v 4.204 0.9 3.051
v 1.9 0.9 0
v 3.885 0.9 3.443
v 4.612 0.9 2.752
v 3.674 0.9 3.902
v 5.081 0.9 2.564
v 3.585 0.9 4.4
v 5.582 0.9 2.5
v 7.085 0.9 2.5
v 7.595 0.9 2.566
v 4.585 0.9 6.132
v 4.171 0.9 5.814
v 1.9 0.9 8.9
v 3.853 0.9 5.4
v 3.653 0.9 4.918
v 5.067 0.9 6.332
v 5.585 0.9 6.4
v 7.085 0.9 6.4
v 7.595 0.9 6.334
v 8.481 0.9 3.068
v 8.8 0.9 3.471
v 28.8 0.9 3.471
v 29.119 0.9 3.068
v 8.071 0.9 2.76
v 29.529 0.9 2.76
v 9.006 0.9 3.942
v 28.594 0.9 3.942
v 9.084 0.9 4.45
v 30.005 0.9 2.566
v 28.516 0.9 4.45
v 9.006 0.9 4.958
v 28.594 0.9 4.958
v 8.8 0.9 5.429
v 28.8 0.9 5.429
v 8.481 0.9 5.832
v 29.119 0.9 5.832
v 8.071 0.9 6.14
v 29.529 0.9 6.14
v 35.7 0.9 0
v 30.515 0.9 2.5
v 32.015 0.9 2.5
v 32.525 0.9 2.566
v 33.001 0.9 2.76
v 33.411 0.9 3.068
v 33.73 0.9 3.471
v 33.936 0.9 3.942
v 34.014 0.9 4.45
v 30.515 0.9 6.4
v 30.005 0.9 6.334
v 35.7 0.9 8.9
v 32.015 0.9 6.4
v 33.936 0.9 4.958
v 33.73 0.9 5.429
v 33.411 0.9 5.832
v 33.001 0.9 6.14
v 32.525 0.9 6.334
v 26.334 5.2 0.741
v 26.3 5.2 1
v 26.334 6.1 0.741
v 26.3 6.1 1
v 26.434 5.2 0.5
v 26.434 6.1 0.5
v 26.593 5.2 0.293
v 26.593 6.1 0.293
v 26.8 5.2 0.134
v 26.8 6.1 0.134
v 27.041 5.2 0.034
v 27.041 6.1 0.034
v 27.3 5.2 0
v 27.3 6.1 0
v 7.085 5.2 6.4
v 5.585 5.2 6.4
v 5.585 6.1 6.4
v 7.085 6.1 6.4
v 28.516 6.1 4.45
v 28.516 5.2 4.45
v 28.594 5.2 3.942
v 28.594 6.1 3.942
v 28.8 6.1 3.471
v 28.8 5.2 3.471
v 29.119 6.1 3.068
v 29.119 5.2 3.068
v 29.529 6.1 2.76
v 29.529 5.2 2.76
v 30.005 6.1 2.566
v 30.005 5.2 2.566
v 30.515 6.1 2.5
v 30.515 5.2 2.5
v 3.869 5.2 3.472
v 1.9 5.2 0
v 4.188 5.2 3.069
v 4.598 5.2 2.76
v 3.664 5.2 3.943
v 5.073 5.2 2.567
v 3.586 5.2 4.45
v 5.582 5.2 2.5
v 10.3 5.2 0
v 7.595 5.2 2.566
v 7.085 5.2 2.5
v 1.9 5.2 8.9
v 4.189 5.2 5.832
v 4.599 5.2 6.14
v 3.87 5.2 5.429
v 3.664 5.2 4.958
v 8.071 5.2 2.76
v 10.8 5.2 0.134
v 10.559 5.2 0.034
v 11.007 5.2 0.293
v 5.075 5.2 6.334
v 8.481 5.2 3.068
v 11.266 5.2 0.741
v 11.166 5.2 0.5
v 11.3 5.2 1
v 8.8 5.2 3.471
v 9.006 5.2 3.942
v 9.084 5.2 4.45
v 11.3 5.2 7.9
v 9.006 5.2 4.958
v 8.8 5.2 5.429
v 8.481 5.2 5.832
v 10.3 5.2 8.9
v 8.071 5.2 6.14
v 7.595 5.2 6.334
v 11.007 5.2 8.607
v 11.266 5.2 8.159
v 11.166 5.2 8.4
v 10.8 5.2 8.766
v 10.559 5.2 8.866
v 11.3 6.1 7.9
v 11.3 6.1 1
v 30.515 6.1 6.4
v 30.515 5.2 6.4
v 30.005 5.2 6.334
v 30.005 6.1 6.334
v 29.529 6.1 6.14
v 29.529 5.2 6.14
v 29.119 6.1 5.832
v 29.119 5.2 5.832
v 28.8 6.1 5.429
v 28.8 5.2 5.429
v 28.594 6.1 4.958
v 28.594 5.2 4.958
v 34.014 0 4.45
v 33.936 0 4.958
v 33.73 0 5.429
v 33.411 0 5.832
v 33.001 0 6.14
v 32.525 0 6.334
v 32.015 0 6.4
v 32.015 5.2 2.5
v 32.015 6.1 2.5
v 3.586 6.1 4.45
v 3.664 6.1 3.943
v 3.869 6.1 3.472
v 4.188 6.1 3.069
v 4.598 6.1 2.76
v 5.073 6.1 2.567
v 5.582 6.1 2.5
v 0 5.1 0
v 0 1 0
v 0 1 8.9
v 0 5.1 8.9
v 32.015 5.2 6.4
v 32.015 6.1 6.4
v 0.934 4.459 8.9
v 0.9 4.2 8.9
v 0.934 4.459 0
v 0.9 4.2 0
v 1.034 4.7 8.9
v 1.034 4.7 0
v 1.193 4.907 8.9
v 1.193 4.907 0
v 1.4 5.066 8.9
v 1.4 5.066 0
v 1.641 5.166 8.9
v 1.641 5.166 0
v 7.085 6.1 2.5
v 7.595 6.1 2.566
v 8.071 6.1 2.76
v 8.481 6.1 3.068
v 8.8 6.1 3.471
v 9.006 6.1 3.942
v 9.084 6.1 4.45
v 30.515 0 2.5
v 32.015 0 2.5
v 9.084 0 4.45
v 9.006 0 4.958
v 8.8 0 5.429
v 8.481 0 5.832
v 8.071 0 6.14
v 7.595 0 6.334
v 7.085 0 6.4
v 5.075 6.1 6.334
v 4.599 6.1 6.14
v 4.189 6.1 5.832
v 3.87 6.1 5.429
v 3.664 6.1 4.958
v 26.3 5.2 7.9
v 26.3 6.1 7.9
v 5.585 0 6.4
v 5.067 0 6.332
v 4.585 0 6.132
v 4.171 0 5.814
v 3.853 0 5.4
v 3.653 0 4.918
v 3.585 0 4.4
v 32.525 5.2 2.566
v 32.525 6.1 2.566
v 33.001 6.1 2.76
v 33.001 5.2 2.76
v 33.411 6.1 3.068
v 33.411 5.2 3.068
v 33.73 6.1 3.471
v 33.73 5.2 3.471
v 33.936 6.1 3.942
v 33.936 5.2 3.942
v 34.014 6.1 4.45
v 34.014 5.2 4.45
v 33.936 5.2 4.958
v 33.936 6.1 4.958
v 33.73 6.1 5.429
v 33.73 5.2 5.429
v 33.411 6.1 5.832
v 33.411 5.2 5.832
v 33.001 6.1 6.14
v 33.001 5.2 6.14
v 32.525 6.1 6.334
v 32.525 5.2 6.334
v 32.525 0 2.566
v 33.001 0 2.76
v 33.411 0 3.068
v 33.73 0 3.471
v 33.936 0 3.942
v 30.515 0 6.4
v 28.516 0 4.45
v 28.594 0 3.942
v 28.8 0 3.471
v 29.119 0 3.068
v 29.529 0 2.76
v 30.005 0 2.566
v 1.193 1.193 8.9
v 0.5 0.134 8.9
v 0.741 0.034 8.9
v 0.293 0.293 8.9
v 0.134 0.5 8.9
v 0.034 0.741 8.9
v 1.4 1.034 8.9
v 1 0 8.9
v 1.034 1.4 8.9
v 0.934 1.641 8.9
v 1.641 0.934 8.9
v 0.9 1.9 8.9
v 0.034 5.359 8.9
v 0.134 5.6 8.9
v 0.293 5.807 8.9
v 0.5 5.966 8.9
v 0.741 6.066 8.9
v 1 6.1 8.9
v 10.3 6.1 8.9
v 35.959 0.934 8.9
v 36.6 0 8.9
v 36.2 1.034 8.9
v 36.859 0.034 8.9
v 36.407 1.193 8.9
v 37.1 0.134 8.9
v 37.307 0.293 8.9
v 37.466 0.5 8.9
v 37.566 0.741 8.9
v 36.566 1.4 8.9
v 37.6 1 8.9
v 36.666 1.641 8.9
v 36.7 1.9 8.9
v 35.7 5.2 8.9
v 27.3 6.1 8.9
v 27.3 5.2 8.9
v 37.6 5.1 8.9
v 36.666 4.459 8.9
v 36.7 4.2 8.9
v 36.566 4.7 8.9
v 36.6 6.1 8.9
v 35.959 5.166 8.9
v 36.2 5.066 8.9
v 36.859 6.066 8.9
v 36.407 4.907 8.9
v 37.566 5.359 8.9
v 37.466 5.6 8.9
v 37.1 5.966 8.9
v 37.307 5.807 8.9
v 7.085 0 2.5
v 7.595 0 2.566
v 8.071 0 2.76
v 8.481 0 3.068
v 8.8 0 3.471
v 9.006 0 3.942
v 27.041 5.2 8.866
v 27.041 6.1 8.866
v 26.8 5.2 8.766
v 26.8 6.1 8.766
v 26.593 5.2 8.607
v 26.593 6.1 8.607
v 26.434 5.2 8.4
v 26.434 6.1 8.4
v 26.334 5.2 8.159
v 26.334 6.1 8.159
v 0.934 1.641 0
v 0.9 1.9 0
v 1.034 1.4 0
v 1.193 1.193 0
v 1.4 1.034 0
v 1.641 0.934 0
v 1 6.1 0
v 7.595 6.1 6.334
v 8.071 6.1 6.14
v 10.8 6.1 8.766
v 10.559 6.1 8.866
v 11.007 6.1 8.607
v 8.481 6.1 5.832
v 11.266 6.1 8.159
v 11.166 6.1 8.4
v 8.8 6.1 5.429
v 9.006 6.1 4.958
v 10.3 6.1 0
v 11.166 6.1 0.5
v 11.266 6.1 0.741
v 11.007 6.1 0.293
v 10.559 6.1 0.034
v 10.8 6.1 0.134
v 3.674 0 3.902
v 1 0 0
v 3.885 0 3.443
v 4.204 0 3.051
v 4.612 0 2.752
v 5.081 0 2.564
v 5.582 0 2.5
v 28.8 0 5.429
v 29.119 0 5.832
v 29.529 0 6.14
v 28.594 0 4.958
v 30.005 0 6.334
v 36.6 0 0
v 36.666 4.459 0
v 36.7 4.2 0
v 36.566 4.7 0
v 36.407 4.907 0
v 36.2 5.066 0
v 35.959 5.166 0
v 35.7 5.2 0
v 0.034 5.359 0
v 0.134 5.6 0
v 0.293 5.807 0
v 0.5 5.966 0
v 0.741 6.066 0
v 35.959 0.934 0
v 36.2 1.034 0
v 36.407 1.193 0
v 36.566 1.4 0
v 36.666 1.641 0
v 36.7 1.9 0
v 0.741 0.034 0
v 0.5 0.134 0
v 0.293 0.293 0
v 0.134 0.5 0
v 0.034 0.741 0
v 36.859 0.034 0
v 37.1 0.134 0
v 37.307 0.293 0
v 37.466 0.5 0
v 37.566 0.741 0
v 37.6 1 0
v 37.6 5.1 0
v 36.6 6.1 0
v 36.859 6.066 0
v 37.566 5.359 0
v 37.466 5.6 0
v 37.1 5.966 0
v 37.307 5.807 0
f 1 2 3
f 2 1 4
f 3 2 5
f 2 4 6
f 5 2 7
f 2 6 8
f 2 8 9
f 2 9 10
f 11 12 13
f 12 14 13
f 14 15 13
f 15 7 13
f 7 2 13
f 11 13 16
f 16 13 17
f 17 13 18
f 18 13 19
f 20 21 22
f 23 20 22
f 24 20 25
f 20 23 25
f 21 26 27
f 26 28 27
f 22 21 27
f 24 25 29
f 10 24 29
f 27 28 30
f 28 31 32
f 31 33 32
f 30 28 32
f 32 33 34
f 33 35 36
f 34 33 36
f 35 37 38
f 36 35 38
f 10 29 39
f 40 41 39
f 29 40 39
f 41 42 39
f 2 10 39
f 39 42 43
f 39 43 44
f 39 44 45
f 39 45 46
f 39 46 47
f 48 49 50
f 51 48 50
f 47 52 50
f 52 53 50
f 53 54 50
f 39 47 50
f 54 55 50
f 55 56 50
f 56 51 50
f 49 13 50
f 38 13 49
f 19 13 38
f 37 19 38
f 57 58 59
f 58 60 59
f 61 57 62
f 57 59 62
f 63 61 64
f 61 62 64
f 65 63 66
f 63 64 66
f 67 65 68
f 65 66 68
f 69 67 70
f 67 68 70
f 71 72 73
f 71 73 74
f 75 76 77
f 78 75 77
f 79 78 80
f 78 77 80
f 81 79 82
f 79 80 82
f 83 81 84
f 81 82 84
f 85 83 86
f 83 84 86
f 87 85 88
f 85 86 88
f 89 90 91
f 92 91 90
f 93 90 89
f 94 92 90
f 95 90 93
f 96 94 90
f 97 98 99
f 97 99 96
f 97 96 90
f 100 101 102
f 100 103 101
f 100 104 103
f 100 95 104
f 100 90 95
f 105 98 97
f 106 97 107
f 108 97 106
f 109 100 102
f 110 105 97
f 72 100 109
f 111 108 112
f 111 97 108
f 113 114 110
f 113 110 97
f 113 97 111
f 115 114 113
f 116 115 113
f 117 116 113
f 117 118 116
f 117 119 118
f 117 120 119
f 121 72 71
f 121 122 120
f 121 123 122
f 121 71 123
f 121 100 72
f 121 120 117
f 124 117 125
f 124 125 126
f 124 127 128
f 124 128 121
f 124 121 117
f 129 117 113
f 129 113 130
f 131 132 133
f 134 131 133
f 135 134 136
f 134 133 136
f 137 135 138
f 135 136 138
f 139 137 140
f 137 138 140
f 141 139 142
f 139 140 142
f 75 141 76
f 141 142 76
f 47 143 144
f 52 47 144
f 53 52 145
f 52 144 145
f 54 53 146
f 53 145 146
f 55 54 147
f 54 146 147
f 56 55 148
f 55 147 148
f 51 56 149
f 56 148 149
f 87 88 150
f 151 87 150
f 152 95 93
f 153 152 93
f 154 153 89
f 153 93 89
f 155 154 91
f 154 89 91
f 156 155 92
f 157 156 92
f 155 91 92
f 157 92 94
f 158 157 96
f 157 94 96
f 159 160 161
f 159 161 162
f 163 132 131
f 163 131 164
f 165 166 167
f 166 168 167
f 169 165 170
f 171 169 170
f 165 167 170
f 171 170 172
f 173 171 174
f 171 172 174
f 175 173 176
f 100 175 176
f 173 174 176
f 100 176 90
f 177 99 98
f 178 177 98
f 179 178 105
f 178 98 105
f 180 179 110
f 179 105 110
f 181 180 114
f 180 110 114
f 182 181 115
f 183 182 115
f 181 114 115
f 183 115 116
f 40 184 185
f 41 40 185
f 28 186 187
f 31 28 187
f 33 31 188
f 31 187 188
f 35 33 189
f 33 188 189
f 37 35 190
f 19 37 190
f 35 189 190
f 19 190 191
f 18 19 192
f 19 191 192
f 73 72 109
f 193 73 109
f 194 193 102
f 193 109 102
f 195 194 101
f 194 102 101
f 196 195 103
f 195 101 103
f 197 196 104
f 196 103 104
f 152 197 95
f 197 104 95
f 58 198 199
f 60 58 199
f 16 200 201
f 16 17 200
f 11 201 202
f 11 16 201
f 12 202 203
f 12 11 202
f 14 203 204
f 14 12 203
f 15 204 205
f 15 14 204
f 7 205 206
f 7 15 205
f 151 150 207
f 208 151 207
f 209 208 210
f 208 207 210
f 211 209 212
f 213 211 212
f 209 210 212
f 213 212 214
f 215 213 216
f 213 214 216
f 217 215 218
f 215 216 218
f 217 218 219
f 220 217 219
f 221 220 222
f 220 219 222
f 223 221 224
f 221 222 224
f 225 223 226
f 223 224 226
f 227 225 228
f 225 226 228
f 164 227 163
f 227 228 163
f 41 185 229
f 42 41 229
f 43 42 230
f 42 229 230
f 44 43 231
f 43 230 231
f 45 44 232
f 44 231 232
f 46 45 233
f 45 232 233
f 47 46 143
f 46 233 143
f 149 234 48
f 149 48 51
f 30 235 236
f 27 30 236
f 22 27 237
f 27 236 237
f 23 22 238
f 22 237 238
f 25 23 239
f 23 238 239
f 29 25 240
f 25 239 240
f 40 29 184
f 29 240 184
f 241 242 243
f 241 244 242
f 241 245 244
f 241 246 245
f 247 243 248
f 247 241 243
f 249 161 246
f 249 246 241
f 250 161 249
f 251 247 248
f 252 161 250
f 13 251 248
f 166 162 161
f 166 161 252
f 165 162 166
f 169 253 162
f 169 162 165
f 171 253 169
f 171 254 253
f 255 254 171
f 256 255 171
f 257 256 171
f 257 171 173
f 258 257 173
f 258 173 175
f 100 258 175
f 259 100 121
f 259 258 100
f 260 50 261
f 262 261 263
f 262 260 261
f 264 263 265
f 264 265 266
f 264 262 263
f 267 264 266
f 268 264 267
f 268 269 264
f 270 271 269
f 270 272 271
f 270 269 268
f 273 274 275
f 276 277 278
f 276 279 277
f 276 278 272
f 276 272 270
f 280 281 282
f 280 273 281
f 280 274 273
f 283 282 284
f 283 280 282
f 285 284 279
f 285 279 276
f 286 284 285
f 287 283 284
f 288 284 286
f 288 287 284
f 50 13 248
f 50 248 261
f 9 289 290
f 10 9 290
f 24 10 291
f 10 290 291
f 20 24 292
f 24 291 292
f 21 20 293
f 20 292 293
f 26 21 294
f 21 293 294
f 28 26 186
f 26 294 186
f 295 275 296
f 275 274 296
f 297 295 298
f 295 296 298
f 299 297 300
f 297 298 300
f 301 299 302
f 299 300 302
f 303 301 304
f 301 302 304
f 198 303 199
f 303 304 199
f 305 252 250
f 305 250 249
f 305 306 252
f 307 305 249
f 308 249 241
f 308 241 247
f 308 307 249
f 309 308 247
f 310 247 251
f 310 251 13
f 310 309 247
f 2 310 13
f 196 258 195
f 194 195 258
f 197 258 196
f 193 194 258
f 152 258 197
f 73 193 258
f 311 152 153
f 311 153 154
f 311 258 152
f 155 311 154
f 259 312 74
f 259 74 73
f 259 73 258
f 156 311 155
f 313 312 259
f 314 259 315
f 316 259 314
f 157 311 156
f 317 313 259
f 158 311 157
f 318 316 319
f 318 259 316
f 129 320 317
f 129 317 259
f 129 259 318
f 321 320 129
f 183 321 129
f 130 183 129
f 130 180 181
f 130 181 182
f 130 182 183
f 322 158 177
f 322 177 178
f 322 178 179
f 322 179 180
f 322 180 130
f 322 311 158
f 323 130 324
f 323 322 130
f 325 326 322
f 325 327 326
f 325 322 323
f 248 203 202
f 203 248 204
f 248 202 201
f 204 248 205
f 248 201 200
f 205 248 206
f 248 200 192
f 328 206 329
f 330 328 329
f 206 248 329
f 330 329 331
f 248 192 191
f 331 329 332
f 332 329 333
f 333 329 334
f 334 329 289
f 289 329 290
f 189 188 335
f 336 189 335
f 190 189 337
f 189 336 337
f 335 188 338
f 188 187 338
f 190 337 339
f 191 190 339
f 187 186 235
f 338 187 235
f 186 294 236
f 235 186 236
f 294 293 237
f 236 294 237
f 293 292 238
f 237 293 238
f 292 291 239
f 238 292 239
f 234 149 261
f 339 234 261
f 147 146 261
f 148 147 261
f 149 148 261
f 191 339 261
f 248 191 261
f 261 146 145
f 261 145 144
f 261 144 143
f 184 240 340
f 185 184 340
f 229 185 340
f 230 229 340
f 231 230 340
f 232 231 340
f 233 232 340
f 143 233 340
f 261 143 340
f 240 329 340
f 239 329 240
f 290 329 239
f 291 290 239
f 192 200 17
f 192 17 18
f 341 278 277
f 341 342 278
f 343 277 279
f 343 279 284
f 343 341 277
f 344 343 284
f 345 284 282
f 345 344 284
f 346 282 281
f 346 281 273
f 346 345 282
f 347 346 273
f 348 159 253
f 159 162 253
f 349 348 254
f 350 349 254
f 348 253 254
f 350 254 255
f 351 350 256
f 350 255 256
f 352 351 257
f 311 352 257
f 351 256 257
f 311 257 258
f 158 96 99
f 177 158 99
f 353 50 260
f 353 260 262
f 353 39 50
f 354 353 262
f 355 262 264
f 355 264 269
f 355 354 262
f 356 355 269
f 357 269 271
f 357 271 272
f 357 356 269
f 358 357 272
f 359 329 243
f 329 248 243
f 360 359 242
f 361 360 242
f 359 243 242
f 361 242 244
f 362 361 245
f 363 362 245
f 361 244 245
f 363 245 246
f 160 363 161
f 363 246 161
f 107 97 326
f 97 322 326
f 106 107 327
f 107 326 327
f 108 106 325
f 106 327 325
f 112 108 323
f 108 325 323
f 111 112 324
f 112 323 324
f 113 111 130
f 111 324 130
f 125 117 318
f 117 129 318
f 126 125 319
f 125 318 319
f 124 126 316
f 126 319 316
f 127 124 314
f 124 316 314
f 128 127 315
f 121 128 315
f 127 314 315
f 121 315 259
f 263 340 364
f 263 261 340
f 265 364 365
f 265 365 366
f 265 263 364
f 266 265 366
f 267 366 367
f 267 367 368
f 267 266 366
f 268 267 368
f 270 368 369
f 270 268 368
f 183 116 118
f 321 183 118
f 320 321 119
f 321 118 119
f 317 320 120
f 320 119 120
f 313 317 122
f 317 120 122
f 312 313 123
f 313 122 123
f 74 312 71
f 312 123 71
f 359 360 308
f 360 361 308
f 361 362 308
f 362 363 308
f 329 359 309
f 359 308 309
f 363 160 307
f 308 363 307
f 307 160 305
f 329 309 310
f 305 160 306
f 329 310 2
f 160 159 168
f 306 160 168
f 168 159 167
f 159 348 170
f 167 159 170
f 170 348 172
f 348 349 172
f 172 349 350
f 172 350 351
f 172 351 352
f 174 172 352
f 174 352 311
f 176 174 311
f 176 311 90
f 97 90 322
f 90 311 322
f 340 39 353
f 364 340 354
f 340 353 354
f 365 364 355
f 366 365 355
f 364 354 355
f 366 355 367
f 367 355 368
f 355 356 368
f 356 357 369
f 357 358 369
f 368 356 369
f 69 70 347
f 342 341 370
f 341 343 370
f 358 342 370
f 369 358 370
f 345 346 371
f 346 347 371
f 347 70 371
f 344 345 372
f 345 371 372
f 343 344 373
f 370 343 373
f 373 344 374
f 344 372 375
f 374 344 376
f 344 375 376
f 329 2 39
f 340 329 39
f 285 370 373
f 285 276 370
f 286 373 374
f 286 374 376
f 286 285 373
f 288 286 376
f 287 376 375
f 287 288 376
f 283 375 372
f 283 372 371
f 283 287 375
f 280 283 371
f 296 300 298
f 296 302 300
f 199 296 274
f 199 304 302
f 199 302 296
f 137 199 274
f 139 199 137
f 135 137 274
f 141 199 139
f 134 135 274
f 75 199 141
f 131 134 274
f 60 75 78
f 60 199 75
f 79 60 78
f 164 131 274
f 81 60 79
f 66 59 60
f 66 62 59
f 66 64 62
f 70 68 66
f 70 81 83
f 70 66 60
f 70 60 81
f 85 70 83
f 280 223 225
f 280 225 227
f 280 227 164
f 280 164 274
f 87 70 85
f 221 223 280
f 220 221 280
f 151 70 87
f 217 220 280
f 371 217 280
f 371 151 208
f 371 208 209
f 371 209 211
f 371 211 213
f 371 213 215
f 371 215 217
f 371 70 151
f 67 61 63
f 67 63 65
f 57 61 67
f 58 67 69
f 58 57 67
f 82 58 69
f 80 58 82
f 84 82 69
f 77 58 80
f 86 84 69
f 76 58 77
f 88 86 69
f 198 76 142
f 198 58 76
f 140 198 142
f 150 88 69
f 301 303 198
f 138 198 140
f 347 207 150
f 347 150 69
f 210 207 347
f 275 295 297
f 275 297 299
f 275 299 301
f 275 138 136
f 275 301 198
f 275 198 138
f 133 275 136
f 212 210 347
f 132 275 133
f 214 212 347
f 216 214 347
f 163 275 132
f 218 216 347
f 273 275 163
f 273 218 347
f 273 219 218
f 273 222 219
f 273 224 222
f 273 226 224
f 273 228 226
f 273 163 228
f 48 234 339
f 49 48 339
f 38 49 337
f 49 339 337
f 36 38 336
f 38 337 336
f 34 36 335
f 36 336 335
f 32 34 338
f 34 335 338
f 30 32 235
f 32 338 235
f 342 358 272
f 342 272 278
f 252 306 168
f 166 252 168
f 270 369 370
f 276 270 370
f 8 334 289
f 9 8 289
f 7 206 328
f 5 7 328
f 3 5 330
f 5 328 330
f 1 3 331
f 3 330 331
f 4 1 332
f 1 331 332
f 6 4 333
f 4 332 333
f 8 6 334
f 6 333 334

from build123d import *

# Parameters (mm, degrees)
CROQUIS1_W              = 37.6
CROQUIS1_H              = 6.1
SALIENTE_EXTRUIR1_DEPTH = 8.9
CROQUIS2_W              = 35.8
CROQUIS2_H              = 4.3
CROQUIS2_W_2            = 15
CROQUIS2_H_2            = 0.9
CORTAR_EXTRUIR2_DEPTH   = 8.9
CROQUIS3_W              = 5.5
CROQUIS3_H              = 3.9
CORTAR_EXTRUIR3_DEPTH   = 8.9
REDONDEO1_R             = 2
REDONDEO2_START         = 5.2
REDONDEO2_DEPTH         = 0.9
REDONDEO2_2_DEPTH       = 0.9
REDONDEO4_R             = 1
REDONDEO5_R             = 1
REDONDEO6_R             = 1
REDONDEO7_R             = 1
REDONDEO8_R             = 1
REDONDEO9_R             = 1
REDONDEO10_R            = 1
REDONDEO11_R            = 1
REDONDEO12_R            = 1
REDONDEO13_R            = 1
REDONDEO14_R            = 1
REDONDEO15_R            = 1


with BuildPart() as part:
    # Croquis1 → Saliente-Extruir1 (new body)
    with BuildSketch(Plane.XY):
        with Locations((18.8, 3.05)):
            Rectangle(CROQUIS1_W, CROQUIS1_H)
    extrude(amount=SALIENTE_EXTRUIR1_DEPTH)

    # Croquis2 → Cortar-Extruir2 (cut)
    with BuildSketch(Plane.XY.offset(8.9)):
        with Locations((18.8, 3.05)):
            Rectangle(CROQUIS2_W, CROQUIS2_H)
        with Locations((18.8, 5.65)):
            Rectangle(CROQUIS2_W_2, CROQUIS2_H_2)
    extrude(amount=-CORTAR_EXTRUIR2_DEPTH, mode=Mode.SUBTRACT)

    # Croquis3 → Cortar-Extruir3 (cut)
    with BuildSketch(Plane(origin=(0, 0, 0), x_dir=(1, 0, 0), z_dir=(0, 1, 0))):
        with Locations((6.335, -4.45)):
            Rectangle(CROQUIS3_W, CROQUIS3_H)
        with Locations((31.265, -4.45)):
            Rectangle(CROQUIS3_W, CROQUIS3_H)
    extrude(amount=CORTAR_EXTRUIR3_DEPTH, mode=Mode.SUBTRACT)

    # Redondeo1
    redondeo1_edges = [part.edges().sort_by_distance(p)[0] for p in [
        (3.585, 0.45, 6.4),
    ]]
    fillet(redondeo1_edges, radius=REDONDEO1_R)


with BuildPart() as redondeo2_tool:
    # Redondeo2: read off the stored shape, not the designer's step
    # Redondeo2 outline → Redondeo2 (new body)
    with BuildSketch(Plane(origin=(0, 0, 0), x_dir=(1, 0, 0), z_dir=(0, 1, 0)).offset(REDONDEO2_START)):
        with BuildLine():
            ThreePointArc((5.585, -6.4), (4.188575996, -5.831782106), (3.585625098, -4.45))
            ThreePointArc((3.585625098, -4.45), (4.187680846, -3.069091484), (5.582498438, -2.500001564))
            Line((5.582498438, -2.500001564), (3.585, -2.5))
            Line((3.585, -2.5), (3.585, -6.4))
            Line((3.585, -6.4), (5.585, -6.4))
        make_face()
        with BuildLine():
            ThreePointArc((9.084374902, -4.45), (8.481424004, -5.831782106), (7.085, -6.4))
            Line((7.085, -6.4), (9.085, -6.4))
            Line((9.085, -6.4), (9.085, -2.5))
            Line((9.085, -2.5), (7.085, -2.5))
            ThreePointArc((7.085, -2.5), (8.481424004, -3.068217894), (9.084374902, -4.45))
        make_face()
        with BuildLine():
            ThreePointArc((28.515625098, -4.45), (29.118575996, -3.068217894), (30.515, -2.5))
            Line((30.515, -2.5), (28.515, -2.5))
            Line((28.515, -2.5), (28.515, -6.4))
            Line((28.515, -6.4), (30.515, -6.4))
            ThreePointArc((30.515, -6.4), (29.118575996, -5.831782106), (28.515625098, -4.45))
        make_face()
        with BuildLine():
            Line((34.015, -2.5), (32.015, -2.5))
            ThreePointArc((32.015, -2.5), (33.411424004, -3.068217894), (34.014374902, -4.45))
            ThreePointArc((34.014374902, -4.45), (33.411424004, -5.831782106), (32.015, -6.4))
            Line((32.015, -6.4), (34.015, -6.4))
            Line((34.015, -6.4), (34.015, -2.5))
        make_face()
    extrude(amount=REDONDEO2_DEPTH)


with BuildPart() as part_1:
    add(part.part)


with BuildPart() as part_2:
    # Redondeo2: joined with redondeo2_tool
    add(part_1.part.fuse(redondeo2_tool.part, tol=0.00001))


with BuildPart() as redondeo2_2_tool:
    # Redondeo2 2 outline → Redondeo2 2 (new body)
    with BuildSketch(Plane(origin=(0, 0, 0), x_dir=(1, 0, 0), z_dir=(0, 1, 0))):
        with BuildLine():
            ThreePointArc((3.585, -4.4), (4.20409356, -3.050862325), (5.582498436, -2.5))
            Line((5.582498436, -2.5), (3.585, -2.5))
            Line((3.585, -2.5), (3.585, -4.4))
        make_face()
        with BuildLine():
            ThreePointArc((9.084374902, -4.45), (8.481424004, -5.831782106), (7.085, -6.4))
            Line((7.085, -6.4), (9.085, -6.4))
            Line((9.085, -6.4), (9.085, -2.5))
            Line((9.085, -2.5), (7.085, -2.5))
            ThreePointArc((7.085, -2.5), (8.481424004, -3.068217894), (9.084374902, -4.45))
        make_face()
        with BuildLine():
            ThreePointArc((28.515625098, -4.45), (29.118575996, -3.068217894), (30.515, -2.5))
            Line((30.515, -2.5), (28.515, -2.5))
            Line((28.515, -2.5), (28.515, -6.4))
            Line((28.515, -6.4), (30.515, -6.4))
            ThreePointArc((30.515, -6.4), (29.118575996, -5.831782106), (28.515625098, -4.45))
        make_face()
        with BuildLine():
            Line((34.015, -2.5), (32.015, -2.5))
            ThreePointArc((32.015, -2.5), (33.411424004, -3.068217894), (34.014374902, -4.45))
            ThreePointArc((34.014374902, -4.45), (33.411424004, -5.831782106), (32.015, -6.4))
            Line((32.015, -6.4), (34.015, -6.4))
            Line((34.015, -6.4), (34.015, -2.5))
        make_face()
    extrude(amount=REDONDEO2_2_DEPTH)


with BuildPart() as part_3:
    add(part_2.part)


with BuildPart() as part_4:
    # Redondeo2 2: joined with redondeo2_2_tool
    add(part_3.part.fuse(redondeo2_2_tool.part, tol=0.00001))

    # Redondeo4
    redondeo4_edges = [part_4.edges().sort_by_distance(p)[0] for p in [
        (0, 0, 4.45),
    ]]
    fillet(redondeo4_edges, radius=REDONDEO4_R)

    # Redondeo5
    redondeo5_edges = [part_4.edges().sort_by_distance(p)[0] for p in [
        (37.6, 0, 4.45),
    ]]
    fillet(redondeo5_edges, radius=REDONDEO5_R)

    # Redondeo6
    redondeo6_edges = [part_4.edges().sort_by_distance(p)[0] for p in [
        (37.6, 6.1, 4.45),
    ]]
    fillet(redondeo6_edges, radius=REDONDEO6_R)

    # Redondeo7
    redondeo7_edges = [part_4.edges().sort_by_distance(p)[0] for p in [
        (0, 6.1, 4.45),
    ]]
    fillet(redondeo7_edges, radius=REDONDEO7_R)

    # Redondeo8
    redondeo8_edges = [part_4.edges().sort_by_distance(p)[0] for p in [
        (0.9, 0.9, 4.45),
    ]]
    fillet(redondeo8_edges, radius=REDONDEO8_R)

    # Redondeo9
    redondeo9_edges = [part_4.edges().sort_by_distance(p)[0] for p in [
        (0.9, 5.2, 4.45),
    ]]
    fillet(redondeo9_edges, radius=REDONDEO9_R)

    # Redondeo10
    redondeo10_edges = [part_4.edges().sort_by_distance(p)[0] for p in [
        (36.7, 0.9, 4.45),
    ]]
    fillet(redondeo10_edges, radius=REDONDEO10_R)

    # Redondeo11
    redondeo11_edges = [part_4.edges().sort_by_distance(p)[0] for p in [
        (36.7, 5.2, 4.45),
    ]]
    fillet(redondeo11_edges, radius=REDONDEO11_R)

    # Redondeo12
    redondeo12_edges = [part_4.edges().sort_by_distance(p)[0] for p in [
        (26.3, 5.65, 8.9),
    ]]
    fillet(redondeo12_edges, radius=REDONDEO12_R)

    # Redondeo13
    redondeo13_edges = [part_4.edges().sort_by_distance(p)[0] for p in [
        (26.3, 5.65, 0),
    ]]
    fillet(redondeo13_edges, radius=REDONDEO13_R)

    # Redondeo14
    redondeo14_edges = [part_4.edges().sort_by_distance(p)[0] for p in [
        (11.3, 5.65, 0),
    ]]
    fillet(redondeo14_edges, radius=REDONDEO14_R)

    # Redondeo15
    redondeo15_edges = [part_4.edges().sort_by_distance(p)[0] for p in [
        (11.3, 5.65, 8.9),
    ]]
    fillet(redondeo15_edges, radius=REDONDEO15_R)


solid = part_4.part
